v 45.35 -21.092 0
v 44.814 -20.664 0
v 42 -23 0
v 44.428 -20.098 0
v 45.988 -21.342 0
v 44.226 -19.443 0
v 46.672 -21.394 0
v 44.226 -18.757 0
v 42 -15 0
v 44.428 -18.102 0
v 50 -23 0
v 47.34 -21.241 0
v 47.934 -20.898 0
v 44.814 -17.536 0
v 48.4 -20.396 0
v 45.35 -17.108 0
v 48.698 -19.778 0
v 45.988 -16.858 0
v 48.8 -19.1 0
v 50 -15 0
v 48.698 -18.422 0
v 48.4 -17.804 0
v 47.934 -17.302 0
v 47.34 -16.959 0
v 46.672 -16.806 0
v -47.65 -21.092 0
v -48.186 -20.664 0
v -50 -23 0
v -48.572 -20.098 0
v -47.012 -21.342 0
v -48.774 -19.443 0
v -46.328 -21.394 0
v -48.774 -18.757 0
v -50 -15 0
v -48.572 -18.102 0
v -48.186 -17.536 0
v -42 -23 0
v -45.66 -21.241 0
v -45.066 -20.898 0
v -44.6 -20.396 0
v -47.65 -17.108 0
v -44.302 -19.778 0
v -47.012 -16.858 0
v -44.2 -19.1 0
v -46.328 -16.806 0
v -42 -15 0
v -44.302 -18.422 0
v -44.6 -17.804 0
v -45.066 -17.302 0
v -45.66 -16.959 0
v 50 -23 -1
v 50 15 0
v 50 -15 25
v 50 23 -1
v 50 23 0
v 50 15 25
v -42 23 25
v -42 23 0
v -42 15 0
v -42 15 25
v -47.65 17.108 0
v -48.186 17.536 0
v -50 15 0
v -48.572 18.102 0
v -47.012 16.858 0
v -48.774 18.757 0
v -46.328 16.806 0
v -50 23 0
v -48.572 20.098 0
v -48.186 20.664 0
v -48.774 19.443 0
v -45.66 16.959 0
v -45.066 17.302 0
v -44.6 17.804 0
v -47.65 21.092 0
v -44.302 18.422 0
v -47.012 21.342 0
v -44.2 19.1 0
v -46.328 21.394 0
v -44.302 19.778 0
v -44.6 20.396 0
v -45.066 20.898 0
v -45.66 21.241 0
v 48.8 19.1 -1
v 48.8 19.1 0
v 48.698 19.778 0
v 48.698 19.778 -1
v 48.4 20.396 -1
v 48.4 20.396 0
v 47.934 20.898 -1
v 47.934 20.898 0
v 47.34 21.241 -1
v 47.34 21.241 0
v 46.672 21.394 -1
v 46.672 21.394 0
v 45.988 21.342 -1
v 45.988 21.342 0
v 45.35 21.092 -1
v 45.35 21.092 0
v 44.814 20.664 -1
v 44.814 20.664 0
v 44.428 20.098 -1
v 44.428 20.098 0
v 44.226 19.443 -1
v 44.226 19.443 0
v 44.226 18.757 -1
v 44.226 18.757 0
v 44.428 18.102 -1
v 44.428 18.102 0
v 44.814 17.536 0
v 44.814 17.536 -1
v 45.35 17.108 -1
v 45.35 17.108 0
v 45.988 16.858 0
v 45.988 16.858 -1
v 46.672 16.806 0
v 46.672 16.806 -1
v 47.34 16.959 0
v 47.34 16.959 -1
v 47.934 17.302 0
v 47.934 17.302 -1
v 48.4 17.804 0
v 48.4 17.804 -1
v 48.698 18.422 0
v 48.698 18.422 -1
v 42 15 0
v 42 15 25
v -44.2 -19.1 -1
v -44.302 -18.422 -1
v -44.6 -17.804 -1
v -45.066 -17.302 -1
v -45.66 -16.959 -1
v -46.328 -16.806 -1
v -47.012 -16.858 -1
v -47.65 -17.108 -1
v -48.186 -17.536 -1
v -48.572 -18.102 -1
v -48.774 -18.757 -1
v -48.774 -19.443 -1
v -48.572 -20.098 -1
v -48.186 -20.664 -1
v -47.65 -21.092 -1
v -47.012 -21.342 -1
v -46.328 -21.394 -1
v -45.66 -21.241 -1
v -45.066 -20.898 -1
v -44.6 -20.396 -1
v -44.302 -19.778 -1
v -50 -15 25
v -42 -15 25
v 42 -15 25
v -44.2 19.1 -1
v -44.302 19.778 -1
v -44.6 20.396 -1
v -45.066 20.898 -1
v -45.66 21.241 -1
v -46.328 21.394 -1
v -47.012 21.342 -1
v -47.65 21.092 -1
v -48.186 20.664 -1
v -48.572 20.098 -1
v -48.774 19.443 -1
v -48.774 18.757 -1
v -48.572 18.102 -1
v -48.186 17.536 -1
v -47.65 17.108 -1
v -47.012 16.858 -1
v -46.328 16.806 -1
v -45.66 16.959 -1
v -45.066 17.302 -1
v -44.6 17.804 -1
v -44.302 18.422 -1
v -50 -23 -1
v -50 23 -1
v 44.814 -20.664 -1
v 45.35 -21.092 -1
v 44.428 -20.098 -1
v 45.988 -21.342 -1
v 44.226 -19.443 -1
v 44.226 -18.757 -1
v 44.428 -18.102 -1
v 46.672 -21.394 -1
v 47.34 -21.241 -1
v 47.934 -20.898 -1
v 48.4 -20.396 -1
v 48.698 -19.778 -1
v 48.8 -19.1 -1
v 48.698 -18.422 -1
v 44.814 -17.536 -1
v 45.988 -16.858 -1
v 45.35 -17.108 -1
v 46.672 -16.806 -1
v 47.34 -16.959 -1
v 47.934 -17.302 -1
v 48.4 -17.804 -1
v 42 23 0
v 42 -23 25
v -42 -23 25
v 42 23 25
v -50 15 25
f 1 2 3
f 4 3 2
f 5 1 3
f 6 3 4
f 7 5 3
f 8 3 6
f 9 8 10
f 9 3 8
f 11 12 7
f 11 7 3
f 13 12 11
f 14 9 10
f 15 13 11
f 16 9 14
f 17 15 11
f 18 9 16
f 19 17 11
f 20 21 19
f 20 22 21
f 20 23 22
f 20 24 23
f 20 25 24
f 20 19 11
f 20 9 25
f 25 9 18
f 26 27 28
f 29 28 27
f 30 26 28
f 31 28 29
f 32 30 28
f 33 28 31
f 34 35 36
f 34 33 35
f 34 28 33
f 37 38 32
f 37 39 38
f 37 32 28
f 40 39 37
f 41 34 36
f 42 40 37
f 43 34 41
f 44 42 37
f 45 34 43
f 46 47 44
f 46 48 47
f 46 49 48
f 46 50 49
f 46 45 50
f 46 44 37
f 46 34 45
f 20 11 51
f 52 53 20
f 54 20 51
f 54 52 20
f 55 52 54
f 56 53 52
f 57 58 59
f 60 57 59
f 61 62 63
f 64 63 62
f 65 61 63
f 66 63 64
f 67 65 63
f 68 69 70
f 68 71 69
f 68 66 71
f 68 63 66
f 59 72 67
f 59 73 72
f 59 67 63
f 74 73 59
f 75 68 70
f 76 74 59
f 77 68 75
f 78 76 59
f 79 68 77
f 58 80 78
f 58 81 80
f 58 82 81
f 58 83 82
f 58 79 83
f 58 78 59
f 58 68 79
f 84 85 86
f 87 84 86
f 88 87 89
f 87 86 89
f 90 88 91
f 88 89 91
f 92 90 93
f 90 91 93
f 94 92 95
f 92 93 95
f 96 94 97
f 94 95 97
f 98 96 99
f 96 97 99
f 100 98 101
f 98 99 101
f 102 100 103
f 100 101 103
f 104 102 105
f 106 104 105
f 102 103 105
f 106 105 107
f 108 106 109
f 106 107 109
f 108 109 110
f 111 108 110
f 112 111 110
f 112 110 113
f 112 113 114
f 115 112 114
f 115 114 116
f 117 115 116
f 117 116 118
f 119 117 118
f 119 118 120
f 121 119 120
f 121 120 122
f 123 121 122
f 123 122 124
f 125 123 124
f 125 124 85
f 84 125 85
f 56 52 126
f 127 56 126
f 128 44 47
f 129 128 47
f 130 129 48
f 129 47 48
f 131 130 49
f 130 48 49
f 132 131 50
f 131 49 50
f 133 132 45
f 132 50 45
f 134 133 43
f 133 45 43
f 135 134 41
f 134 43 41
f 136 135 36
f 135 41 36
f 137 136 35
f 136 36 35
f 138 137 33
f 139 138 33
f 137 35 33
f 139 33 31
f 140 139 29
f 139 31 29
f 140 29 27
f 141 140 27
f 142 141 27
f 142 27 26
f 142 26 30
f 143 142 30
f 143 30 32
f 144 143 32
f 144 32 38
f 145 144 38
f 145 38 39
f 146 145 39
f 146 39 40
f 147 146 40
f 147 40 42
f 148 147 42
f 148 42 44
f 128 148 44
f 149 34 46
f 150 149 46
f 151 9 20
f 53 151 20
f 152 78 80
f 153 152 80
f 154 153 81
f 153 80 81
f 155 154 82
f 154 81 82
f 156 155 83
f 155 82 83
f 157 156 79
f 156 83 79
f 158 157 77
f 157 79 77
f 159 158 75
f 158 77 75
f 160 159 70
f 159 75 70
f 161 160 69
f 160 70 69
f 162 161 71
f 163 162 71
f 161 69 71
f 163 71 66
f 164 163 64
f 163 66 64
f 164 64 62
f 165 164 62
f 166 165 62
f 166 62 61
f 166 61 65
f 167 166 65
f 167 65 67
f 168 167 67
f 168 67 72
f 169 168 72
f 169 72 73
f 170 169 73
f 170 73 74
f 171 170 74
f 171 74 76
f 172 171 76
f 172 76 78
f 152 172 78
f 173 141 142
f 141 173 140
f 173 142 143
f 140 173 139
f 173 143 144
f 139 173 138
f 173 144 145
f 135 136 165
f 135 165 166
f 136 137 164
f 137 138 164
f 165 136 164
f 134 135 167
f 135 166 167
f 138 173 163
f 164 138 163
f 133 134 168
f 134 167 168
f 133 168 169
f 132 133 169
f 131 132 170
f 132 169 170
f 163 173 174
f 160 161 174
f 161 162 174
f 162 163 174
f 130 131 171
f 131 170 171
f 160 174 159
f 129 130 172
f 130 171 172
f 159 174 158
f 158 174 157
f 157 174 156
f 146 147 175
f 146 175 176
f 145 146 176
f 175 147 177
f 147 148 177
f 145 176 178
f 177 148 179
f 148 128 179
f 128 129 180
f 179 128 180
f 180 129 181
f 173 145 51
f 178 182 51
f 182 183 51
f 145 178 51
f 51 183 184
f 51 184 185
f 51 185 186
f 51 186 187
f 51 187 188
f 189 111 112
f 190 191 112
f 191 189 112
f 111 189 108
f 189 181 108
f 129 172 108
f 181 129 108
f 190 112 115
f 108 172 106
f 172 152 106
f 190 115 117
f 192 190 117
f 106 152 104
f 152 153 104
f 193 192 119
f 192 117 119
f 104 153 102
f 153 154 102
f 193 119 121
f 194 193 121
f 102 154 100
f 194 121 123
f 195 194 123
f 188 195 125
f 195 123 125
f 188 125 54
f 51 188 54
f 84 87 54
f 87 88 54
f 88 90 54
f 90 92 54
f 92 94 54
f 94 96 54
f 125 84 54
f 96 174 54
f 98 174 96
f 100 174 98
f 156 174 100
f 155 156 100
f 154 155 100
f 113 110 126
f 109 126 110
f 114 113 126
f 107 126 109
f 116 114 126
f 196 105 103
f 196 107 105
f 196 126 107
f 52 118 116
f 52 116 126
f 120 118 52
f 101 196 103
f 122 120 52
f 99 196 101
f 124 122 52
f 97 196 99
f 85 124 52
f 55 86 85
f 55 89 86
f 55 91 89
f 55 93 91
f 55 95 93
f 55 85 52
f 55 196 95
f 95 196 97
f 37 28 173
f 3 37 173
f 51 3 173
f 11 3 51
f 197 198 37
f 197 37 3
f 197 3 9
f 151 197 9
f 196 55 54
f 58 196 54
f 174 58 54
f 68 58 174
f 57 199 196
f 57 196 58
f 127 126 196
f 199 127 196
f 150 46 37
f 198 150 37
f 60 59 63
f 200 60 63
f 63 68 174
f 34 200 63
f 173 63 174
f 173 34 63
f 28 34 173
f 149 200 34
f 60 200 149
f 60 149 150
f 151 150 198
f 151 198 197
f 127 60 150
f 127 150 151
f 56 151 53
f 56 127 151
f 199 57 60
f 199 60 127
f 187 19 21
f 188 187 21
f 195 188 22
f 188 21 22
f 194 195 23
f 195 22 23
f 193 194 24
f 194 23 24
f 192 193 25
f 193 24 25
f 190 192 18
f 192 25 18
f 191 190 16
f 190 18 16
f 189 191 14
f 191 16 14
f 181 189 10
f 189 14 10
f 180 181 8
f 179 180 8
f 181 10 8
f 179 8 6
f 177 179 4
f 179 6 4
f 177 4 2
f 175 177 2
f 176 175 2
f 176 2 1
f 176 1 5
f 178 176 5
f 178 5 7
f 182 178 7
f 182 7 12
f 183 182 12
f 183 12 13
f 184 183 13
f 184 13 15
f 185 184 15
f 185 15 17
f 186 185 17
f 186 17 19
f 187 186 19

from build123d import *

# Parameters (mm, degrees)
F1_DEPTH = 25
F0_W     = 8
F0_H     = 8
F2_DEPTH = 1
F3_R     = 2.3
F4_DEPTH = 25


with BuildPart() as f1:
    # F0 (on Top) → F1 (new body)
    with BuildSketch(Plane.XY):
        Polygon((42, 23), (-42, 23), (-42, 15), (-50, 15), (-50, -15), (-42, -15), (-42, -23), (42, -23), (42, -15), (50, -15), (50, 15), (42, 15), align=None)
    extrude(amount=F1_DEPTH)

    # F0 (on Top) → F2 (join)
    with BuildSketch(Plane.XY):
        with Locations((-46, -19)):
            Rectangle(F0_W, F0_H)
        with Locations((-46, 19)):
            Rectangle(F0_W, F0_H)
        with Locations((46, 19)):
            Rectangle(F0_W, F0_H)
        with Locations((46, -19)):
            Rectangle(F0_W, F0_H)
        Polygon((42, 23), (-42, 23), (-42, 15), (-50, 15), (-50, -15), (-42, -15), (-42, -23), (42, -23), (42, -15), (50, -15), (50, 15), (42, 15), align=None)
    extrude(amount=-F2_DEPTH)

    # F3 (on Top) → F4 (cut)
    with BuildSketch(Plane.XY):
        with Locations((-46.5, -19.1)):
            Circle(F3_R)
        with Locations((46.5, -19.1)):
            Circle(F3_R)
        with Locations((-46.5, 19.1)):
            Circle(F3_R)
        with Locations((46.5, 19.1)):
            Circle(F3_R)
    extrude(amount=-F4_DEPTH, mode=Mode.SUBTRACT)


solid = f1.part
